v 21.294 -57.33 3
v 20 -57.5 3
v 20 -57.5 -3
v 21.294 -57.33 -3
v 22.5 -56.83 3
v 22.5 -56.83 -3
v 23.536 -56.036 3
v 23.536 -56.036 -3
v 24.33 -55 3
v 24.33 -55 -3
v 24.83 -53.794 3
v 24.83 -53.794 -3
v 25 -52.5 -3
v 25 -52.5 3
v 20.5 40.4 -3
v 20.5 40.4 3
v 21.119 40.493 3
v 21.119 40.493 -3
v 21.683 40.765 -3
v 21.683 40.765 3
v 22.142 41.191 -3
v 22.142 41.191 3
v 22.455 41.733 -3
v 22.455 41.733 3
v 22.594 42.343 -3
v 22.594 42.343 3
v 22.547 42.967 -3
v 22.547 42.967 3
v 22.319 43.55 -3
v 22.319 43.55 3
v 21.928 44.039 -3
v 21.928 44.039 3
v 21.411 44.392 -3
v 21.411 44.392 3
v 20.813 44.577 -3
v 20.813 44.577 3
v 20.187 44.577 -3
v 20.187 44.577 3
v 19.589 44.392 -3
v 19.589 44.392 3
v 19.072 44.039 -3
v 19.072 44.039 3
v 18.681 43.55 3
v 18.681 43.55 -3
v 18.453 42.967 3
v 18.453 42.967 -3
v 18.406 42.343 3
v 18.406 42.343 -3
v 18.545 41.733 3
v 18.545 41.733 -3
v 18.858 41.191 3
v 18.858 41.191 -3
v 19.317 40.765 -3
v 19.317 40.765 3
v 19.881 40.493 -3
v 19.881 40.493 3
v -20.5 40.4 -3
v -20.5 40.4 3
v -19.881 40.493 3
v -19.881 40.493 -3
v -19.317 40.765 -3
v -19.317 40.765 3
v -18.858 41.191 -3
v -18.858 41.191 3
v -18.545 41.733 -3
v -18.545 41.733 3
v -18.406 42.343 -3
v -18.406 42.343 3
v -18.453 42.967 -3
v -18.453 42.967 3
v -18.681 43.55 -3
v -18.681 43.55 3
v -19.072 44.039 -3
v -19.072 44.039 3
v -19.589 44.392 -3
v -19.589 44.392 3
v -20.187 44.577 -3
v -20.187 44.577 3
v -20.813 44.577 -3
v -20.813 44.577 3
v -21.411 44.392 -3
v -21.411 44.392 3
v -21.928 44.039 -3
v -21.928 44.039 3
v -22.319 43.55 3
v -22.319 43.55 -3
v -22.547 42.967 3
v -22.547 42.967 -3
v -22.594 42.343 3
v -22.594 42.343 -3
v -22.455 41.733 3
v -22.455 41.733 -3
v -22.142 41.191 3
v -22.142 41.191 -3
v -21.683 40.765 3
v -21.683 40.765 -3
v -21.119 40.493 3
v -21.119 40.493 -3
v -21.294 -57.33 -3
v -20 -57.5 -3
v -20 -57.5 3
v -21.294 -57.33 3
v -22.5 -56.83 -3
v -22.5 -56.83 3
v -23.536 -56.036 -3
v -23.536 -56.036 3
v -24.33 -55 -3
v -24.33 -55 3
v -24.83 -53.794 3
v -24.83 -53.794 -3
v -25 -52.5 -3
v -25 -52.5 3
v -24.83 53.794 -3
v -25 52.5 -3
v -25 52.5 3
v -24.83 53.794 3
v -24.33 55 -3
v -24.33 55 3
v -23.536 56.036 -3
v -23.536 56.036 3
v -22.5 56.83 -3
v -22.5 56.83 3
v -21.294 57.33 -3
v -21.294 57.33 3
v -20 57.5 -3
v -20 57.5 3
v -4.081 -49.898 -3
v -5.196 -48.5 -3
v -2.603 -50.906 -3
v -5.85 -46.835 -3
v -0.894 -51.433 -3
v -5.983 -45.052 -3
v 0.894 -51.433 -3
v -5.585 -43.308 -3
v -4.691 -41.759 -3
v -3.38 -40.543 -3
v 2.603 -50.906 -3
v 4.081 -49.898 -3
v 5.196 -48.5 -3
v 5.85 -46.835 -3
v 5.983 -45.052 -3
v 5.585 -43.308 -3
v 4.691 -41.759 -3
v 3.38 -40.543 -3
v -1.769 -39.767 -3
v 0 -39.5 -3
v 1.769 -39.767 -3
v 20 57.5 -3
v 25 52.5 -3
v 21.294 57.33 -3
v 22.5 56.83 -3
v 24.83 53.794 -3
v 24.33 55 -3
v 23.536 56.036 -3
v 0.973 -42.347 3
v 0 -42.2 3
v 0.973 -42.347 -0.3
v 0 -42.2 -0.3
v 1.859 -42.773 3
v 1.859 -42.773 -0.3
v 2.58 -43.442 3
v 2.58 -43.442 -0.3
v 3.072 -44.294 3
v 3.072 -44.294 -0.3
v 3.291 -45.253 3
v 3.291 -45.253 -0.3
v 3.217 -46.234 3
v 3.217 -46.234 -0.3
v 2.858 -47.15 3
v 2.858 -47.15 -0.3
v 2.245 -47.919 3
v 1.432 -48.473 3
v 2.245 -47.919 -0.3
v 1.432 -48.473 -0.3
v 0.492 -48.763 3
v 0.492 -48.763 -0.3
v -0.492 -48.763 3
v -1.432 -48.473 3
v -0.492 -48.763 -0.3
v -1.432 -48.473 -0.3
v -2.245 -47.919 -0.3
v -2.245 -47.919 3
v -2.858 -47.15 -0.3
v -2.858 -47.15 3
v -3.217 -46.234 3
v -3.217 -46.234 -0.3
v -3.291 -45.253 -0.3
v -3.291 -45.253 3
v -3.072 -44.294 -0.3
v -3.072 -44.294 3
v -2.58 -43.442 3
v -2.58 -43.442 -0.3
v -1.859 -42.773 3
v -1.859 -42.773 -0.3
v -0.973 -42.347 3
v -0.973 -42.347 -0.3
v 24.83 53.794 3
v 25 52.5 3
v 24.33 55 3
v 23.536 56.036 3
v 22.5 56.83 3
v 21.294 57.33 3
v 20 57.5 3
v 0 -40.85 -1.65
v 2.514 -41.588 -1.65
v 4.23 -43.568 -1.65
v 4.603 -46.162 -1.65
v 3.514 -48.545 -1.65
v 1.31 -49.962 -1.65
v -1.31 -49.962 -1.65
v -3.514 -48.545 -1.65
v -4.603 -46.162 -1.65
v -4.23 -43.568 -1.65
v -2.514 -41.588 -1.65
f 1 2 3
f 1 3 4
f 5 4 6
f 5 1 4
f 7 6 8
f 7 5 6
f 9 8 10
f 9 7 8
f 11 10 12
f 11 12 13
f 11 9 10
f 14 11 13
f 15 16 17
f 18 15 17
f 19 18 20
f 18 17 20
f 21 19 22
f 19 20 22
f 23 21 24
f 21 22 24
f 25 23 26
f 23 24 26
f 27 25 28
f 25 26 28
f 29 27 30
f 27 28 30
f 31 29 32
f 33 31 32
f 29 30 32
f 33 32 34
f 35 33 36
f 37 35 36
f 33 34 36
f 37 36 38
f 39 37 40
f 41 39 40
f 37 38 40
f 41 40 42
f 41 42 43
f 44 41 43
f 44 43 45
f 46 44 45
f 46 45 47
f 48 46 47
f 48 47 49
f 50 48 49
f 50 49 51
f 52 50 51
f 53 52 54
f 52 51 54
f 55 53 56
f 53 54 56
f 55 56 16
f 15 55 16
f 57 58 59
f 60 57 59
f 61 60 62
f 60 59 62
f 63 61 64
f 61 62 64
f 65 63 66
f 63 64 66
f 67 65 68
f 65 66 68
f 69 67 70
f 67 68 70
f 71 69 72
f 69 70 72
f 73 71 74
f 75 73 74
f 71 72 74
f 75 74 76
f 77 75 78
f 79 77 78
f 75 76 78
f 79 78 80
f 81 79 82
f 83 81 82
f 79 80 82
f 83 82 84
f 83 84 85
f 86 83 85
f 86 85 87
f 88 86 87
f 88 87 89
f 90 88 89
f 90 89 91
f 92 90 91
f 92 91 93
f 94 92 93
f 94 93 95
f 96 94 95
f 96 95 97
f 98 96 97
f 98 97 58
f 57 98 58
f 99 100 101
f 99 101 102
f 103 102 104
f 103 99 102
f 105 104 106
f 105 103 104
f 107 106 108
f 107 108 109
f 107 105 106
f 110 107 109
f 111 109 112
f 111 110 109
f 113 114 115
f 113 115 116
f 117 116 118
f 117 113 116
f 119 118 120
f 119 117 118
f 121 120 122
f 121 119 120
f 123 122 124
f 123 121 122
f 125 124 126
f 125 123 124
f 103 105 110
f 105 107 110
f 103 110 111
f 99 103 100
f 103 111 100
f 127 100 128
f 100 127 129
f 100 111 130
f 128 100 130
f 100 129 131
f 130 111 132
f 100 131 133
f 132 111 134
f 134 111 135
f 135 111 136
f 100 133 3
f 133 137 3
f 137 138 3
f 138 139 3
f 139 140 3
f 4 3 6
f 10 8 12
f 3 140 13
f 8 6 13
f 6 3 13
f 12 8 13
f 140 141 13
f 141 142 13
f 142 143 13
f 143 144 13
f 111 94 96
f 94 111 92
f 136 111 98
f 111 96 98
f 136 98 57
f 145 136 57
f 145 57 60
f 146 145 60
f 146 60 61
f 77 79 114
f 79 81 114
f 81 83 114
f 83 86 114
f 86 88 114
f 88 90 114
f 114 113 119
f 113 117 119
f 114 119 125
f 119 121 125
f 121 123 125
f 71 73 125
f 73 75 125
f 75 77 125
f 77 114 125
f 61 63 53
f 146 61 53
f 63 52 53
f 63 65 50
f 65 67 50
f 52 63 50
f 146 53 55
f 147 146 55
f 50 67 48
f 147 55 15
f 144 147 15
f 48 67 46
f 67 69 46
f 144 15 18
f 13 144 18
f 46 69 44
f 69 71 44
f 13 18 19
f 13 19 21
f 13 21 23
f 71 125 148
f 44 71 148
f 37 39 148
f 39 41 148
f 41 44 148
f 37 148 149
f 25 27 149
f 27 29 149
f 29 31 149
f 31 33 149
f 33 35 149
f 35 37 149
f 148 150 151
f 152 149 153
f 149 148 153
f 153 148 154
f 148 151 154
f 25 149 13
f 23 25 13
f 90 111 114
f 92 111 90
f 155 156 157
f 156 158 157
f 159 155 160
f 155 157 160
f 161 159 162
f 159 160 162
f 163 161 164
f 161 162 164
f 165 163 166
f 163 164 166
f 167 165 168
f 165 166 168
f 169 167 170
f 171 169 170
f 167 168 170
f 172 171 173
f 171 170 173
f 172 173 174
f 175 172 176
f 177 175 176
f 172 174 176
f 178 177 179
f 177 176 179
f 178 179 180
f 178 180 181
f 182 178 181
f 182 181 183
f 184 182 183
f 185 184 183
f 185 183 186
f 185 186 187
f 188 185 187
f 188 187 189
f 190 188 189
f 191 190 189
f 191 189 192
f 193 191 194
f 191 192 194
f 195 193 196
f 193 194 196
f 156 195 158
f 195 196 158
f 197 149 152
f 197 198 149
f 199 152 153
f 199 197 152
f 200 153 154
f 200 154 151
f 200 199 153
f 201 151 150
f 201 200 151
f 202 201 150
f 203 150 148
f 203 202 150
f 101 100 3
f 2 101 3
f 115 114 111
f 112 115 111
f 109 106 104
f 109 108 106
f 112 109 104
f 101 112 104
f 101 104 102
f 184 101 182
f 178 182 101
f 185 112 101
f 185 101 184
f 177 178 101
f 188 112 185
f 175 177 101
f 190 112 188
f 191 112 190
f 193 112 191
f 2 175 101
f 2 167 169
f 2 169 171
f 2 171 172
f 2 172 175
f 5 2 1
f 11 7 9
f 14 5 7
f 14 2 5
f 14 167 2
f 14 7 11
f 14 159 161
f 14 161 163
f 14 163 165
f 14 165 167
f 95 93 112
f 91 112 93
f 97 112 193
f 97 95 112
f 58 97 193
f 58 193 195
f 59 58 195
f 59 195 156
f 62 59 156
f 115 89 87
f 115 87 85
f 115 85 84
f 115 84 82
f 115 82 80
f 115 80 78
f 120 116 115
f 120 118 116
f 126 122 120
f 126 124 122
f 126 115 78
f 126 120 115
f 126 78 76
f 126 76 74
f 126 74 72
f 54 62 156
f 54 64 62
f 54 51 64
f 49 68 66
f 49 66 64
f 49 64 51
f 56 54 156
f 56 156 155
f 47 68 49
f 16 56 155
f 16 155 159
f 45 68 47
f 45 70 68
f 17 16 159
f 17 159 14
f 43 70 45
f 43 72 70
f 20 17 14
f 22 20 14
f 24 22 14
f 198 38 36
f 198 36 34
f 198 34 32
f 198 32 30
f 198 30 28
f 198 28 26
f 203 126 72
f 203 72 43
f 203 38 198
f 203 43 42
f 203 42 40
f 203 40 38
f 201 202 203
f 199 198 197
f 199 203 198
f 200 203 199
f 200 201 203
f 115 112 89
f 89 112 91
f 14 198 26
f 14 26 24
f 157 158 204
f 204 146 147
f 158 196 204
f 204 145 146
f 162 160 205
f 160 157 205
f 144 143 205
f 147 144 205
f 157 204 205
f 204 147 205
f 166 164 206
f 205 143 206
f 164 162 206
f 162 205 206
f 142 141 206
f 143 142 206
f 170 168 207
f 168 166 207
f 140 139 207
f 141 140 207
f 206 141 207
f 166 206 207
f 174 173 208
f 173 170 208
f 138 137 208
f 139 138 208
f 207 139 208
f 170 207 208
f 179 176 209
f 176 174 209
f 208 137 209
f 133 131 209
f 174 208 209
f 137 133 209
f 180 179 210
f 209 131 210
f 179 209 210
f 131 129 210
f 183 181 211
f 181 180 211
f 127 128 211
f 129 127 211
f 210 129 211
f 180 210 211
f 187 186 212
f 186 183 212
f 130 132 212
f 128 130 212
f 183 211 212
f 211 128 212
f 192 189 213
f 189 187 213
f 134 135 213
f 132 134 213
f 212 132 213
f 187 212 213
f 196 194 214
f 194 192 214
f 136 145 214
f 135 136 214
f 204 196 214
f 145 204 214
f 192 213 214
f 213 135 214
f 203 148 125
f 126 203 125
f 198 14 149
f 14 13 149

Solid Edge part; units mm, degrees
sketch "Sketch1" plane through (0, 0, 0) normal (0, 0, 1) x (1, 0, 0)
  line L0 (-25, -57.5) -> (25, -57.5)
  line L1 (25, -57.5) -> (25, 57.5)
  line L2 (25, 57.5) -> (-25, 57.5)
  line L3 (-25, 57.5) -> (-25, -57.5)
  dimension "D1" = 50
  dimension "D2" = 115
extrude "Protrusion1" add sketch "Sketch1" along normal mid plane 6
fillet "Round_1" radius 5 4 edges at (25, 57.5, 0) (-25, 57.5, 0) (25, -57.5, 0) (-25, -57.5, 0)
hole "Hole_1" at (-20.5, 42.5, 3) direction (0, 0, -1) diameter 4.2 end up to next
hole "Hole1" at (20.5, 42.5, 3) direction (0, 0, -1) diameter 4.2 end up to next
hole "Hole_3" at (0, -45.5, -3) direction (0, 0, 1) diameter 6.6 end up to next countersink diameter 12 countersink angle 90
